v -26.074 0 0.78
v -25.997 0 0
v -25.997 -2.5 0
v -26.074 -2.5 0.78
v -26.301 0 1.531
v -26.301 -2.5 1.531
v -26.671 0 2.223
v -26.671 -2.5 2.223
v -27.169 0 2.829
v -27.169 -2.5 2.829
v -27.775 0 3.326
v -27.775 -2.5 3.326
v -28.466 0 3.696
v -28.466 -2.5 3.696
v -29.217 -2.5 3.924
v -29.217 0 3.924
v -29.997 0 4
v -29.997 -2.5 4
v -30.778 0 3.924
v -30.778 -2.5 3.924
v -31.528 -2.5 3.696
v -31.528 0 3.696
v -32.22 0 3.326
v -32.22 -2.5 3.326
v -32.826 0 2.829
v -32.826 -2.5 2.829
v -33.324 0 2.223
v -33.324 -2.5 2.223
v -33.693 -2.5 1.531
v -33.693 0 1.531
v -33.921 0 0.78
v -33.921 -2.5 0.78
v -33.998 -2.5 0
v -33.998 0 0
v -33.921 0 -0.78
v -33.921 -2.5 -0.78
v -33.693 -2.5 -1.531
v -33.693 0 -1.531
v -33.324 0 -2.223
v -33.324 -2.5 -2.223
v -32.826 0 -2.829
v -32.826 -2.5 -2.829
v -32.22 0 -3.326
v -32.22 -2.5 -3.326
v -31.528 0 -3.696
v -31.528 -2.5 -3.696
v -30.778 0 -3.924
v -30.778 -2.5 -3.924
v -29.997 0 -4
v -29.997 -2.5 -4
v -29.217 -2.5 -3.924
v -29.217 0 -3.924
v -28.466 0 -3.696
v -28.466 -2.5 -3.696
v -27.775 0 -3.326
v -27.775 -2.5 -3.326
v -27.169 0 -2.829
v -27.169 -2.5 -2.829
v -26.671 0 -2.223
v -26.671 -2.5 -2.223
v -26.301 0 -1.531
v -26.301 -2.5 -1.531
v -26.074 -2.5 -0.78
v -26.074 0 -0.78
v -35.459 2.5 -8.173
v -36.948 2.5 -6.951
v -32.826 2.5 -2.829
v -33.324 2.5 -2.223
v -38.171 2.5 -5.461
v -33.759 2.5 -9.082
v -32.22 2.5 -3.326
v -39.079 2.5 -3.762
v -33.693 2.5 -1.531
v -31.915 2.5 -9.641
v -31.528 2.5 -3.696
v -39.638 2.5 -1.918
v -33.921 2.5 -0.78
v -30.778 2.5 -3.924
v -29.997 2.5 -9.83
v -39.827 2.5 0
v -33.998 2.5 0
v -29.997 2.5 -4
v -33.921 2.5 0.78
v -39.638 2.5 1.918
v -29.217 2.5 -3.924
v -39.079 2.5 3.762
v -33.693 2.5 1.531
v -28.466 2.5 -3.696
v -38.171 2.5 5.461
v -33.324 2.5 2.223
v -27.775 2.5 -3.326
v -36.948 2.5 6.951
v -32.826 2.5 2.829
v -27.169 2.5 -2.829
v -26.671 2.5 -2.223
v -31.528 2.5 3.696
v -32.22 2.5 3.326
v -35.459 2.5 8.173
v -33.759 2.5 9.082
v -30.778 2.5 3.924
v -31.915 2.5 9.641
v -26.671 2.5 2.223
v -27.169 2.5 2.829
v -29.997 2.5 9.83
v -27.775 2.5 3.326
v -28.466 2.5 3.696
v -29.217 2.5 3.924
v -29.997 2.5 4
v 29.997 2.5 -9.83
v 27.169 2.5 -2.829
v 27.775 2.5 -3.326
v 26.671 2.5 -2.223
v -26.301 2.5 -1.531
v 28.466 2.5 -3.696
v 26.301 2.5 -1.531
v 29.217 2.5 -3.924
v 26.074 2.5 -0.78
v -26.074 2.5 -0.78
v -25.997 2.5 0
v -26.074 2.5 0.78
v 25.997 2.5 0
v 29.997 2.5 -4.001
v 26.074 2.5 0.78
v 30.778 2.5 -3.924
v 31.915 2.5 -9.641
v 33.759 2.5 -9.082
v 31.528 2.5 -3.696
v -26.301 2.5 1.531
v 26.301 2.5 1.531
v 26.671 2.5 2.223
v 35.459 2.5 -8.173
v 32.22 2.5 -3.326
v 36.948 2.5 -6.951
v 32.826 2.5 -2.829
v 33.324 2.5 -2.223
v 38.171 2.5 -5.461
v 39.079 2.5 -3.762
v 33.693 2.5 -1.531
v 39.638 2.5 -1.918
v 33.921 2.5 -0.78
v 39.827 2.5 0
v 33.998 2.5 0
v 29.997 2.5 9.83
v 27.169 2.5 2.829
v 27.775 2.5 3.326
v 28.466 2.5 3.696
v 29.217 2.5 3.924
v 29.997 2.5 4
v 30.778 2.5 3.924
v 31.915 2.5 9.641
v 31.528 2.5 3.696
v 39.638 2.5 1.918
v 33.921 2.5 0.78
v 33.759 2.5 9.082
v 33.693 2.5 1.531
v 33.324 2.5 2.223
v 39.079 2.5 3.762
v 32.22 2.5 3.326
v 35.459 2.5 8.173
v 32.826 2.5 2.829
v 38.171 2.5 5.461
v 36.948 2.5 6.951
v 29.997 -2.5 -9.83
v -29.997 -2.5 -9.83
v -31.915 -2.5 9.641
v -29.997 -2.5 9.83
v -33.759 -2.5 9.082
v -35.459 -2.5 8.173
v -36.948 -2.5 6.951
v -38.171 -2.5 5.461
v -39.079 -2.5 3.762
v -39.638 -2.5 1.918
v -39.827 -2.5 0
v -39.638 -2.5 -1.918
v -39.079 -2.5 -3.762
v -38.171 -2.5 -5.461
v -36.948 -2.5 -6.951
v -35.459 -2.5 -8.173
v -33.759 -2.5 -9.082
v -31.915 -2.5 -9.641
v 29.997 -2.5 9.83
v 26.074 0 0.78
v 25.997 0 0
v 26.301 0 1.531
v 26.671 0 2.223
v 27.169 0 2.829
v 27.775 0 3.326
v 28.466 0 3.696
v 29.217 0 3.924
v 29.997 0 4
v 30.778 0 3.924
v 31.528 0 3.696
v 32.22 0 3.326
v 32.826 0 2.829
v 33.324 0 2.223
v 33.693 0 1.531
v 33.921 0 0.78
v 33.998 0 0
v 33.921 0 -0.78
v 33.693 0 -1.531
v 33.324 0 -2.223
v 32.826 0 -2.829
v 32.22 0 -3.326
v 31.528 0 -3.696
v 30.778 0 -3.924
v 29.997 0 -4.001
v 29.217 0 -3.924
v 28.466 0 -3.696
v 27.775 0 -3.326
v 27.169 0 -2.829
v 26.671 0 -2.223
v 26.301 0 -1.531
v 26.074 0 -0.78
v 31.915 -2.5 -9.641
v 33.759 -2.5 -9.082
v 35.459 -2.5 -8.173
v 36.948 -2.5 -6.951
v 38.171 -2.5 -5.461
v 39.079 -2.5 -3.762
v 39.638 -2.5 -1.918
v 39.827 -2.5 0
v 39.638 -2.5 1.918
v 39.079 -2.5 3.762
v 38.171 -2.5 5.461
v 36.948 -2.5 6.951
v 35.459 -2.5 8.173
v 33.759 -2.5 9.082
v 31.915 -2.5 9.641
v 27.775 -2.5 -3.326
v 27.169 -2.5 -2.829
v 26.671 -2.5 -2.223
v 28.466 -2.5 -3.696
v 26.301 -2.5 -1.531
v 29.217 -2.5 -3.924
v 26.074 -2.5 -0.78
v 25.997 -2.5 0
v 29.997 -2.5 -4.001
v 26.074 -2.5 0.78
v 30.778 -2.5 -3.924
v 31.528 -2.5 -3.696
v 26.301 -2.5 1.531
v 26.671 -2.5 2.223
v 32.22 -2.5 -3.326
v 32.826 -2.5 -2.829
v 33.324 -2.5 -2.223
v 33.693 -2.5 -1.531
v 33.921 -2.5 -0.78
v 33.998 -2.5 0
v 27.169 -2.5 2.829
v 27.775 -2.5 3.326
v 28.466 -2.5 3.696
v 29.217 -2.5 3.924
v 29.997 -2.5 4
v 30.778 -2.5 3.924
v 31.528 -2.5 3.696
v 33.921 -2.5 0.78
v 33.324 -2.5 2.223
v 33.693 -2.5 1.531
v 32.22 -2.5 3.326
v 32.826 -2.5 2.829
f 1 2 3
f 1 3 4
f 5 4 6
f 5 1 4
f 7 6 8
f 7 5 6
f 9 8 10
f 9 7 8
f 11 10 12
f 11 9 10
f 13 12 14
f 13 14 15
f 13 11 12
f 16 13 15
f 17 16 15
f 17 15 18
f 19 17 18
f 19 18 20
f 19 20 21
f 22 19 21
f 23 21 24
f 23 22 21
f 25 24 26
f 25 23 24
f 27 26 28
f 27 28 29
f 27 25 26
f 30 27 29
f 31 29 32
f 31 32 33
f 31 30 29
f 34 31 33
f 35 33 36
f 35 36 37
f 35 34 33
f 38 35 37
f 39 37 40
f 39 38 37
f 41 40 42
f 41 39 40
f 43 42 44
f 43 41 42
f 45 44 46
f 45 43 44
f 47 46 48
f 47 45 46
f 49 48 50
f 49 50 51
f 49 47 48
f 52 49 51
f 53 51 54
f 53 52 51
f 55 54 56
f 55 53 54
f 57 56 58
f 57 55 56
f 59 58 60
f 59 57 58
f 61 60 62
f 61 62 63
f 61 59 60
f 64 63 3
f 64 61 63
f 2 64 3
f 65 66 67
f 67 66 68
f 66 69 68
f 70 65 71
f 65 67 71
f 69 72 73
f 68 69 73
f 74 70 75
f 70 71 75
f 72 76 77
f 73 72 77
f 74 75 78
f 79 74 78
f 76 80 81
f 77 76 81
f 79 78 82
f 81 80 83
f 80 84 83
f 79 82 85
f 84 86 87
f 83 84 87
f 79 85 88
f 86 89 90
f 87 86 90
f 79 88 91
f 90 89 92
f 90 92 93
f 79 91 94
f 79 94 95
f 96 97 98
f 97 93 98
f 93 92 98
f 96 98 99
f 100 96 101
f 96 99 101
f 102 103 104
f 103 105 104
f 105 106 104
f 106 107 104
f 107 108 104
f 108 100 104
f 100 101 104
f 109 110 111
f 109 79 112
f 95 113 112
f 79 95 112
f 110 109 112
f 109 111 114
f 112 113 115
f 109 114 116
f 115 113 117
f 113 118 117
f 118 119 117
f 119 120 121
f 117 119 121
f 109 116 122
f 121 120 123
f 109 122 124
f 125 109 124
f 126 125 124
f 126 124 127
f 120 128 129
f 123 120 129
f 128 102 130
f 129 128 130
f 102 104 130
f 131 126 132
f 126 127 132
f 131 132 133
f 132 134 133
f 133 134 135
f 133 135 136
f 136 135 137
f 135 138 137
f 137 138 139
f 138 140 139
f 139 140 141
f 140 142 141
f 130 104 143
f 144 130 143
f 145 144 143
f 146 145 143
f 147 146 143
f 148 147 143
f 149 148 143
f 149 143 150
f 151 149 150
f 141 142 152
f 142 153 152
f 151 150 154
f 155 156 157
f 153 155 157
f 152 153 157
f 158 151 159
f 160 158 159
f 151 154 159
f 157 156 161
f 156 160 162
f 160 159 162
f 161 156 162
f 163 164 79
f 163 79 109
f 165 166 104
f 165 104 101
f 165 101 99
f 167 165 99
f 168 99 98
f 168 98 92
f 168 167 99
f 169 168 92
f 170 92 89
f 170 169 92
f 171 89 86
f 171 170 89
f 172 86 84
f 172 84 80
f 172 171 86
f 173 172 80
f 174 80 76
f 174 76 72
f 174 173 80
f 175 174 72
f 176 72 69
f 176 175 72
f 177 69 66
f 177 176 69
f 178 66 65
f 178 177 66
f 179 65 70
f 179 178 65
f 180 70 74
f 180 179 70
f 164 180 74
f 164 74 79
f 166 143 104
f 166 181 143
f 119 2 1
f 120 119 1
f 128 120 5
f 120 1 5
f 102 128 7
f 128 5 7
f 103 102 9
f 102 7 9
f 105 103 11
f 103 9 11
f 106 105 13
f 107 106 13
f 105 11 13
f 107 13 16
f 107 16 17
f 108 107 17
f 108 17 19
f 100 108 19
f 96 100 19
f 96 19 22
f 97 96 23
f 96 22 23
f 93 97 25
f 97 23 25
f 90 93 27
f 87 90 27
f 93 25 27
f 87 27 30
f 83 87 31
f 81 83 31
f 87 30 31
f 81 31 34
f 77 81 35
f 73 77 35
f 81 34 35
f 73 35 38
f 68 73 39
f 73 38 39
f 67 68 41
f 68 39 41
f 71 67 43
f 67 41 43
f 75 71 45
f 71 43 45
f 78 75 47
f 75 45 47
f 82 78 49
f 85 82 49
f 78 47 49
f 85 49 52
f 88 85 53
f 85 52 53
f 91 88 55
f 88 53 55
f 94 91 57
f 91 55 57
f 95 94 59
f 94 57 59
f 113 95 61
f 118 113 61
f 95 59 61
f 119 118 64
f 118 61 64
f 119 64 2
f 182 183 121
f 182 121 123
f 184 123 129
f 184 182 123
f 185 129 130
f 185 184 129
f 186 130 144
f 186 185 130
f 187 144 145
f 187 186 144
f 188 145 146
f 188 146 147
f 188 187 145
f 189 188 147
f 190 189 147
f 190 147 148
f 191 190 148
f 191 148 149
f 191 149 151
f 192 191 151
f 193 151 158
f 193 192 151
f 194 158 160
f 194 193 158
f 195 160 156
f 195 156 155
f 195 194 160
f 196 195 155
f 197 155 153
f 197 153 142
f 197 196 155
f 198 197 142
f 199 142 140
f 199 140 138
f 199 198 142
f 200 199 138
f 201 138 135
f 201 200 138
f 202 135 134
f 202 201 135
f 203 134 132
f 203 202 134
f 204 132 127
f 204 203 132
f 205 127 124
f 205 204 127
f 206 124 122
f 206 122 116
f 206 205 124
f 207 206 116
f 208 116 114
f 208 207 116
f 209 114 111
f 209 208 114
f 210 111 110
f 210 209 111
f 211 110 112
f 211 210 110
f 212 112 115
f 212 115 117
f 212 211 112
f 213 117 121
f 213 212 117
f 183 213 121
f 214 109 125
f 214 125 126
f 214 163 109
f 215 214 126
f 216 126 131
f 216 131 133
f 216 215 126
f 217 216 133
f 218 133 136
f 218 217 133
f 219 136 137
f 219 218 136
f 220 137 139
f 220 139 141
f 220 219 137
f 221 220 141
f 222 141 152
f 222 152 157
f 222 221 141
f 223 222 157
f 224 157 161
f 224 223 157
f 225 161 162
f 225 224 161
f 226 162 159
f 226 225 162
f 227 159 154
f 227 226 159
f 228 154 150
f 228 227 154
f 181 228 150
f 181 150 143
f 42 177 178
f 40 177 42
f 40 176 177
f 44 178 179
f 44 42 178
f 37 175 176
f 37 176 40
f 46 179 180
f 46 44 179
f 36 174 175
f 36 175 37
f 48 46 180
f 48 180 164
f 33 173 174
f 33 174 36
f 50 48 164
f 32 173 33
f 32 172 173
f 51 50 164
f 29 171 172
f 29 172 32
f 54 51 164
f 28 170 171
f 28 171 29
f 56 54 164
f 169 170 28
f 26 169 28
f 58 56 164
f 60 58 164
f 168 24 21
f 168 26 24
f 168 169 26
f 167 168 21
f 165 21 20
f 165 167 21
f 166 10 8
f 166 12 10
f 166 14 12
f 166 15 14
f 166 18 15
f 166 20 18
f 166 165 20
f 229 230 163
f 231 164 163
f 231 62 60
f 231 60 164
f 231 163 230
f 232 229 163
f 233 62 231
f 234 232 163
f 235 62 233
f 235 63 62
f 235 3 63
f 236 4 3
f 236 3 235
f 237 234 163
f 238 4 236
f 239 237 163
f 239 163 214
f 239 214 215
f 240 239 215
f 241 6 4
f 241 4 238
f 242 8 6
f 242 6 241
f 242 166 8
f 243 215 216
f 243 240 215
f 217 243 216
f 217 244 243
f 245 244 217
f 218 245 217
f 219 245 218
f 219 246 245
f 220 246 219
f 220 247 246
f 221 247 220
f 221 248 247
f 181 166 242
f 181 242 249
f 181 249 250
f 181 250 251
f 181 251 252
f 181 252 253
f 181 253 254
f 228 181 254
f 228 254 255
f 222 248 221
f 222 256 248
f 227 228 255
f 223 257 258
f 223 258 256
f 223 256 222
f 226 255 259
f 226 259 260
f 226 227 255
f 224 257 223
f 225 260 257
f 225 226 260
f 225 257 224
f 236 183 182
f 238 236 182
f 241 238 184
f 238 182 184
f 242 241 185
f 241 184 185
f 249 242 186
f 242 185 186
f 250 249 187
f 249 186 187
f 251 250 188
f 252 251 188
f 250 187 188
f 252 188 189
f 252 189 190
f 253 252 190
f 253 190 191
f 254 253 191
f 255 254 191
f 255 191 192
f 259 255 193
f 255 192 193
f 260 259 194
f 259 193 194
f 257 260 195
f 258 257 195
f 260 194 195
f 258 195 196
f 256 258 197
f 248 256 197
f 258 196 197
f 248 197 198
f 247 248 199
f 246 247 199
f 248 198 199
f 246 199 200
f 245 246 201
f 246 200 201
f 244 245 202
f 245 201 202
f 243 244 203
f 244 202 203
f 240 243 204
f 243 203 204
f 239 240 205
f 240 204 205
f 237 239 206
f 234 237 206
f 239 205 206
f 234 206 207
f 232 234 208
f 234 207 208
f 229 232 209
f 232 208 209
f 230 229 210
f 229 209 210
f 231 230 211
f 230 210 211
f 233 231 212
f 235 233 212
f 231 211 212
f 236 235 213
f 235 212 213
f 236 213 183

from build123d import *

# Parameters (mm, degrees)
F0_R     = 4.0005
F1_DEPTH = 2.5


with BuildPart() as f1:
    # F0 (on Front) → F1 (new body, symmetric)
    with BuildSketch(Plane.XZ):
        with BuildLine():
            Line((29.9974, 9.8298), (0, 9.8298))
            Line((0, 9.8298), (-29.9974, 9.8298))
            ThreePointArc((-29.9974, 9.8298), (-39.8272, 0), (-29.9974, -9.8298))
            Line((-29.9974, -9.8298), (0, -9.8298))
            Line((0, -9.8298), (29.9974, -9.8298))
            ThreePointArc((29.9974, -9.8298), (39.8272, 0), (29.9974, 9.8298))
        make_face()
        with Locations((-29.9974, 0)):
            Circle(F0_R, mode=Mode.SUBTRACT)
        with BuildLine():
            ThreePointArc((33.9979, 0), (29.9974, -4.0005), (25.9969, 0))
            ThreePointArc((25.9969, 0), (29.9974, 4.0005), (33.9979, 0))
        make_face(mode=Mode.SUBTRACT)
    extrude(amount=F1_DEPTH, both=True)


solid = f1.part
